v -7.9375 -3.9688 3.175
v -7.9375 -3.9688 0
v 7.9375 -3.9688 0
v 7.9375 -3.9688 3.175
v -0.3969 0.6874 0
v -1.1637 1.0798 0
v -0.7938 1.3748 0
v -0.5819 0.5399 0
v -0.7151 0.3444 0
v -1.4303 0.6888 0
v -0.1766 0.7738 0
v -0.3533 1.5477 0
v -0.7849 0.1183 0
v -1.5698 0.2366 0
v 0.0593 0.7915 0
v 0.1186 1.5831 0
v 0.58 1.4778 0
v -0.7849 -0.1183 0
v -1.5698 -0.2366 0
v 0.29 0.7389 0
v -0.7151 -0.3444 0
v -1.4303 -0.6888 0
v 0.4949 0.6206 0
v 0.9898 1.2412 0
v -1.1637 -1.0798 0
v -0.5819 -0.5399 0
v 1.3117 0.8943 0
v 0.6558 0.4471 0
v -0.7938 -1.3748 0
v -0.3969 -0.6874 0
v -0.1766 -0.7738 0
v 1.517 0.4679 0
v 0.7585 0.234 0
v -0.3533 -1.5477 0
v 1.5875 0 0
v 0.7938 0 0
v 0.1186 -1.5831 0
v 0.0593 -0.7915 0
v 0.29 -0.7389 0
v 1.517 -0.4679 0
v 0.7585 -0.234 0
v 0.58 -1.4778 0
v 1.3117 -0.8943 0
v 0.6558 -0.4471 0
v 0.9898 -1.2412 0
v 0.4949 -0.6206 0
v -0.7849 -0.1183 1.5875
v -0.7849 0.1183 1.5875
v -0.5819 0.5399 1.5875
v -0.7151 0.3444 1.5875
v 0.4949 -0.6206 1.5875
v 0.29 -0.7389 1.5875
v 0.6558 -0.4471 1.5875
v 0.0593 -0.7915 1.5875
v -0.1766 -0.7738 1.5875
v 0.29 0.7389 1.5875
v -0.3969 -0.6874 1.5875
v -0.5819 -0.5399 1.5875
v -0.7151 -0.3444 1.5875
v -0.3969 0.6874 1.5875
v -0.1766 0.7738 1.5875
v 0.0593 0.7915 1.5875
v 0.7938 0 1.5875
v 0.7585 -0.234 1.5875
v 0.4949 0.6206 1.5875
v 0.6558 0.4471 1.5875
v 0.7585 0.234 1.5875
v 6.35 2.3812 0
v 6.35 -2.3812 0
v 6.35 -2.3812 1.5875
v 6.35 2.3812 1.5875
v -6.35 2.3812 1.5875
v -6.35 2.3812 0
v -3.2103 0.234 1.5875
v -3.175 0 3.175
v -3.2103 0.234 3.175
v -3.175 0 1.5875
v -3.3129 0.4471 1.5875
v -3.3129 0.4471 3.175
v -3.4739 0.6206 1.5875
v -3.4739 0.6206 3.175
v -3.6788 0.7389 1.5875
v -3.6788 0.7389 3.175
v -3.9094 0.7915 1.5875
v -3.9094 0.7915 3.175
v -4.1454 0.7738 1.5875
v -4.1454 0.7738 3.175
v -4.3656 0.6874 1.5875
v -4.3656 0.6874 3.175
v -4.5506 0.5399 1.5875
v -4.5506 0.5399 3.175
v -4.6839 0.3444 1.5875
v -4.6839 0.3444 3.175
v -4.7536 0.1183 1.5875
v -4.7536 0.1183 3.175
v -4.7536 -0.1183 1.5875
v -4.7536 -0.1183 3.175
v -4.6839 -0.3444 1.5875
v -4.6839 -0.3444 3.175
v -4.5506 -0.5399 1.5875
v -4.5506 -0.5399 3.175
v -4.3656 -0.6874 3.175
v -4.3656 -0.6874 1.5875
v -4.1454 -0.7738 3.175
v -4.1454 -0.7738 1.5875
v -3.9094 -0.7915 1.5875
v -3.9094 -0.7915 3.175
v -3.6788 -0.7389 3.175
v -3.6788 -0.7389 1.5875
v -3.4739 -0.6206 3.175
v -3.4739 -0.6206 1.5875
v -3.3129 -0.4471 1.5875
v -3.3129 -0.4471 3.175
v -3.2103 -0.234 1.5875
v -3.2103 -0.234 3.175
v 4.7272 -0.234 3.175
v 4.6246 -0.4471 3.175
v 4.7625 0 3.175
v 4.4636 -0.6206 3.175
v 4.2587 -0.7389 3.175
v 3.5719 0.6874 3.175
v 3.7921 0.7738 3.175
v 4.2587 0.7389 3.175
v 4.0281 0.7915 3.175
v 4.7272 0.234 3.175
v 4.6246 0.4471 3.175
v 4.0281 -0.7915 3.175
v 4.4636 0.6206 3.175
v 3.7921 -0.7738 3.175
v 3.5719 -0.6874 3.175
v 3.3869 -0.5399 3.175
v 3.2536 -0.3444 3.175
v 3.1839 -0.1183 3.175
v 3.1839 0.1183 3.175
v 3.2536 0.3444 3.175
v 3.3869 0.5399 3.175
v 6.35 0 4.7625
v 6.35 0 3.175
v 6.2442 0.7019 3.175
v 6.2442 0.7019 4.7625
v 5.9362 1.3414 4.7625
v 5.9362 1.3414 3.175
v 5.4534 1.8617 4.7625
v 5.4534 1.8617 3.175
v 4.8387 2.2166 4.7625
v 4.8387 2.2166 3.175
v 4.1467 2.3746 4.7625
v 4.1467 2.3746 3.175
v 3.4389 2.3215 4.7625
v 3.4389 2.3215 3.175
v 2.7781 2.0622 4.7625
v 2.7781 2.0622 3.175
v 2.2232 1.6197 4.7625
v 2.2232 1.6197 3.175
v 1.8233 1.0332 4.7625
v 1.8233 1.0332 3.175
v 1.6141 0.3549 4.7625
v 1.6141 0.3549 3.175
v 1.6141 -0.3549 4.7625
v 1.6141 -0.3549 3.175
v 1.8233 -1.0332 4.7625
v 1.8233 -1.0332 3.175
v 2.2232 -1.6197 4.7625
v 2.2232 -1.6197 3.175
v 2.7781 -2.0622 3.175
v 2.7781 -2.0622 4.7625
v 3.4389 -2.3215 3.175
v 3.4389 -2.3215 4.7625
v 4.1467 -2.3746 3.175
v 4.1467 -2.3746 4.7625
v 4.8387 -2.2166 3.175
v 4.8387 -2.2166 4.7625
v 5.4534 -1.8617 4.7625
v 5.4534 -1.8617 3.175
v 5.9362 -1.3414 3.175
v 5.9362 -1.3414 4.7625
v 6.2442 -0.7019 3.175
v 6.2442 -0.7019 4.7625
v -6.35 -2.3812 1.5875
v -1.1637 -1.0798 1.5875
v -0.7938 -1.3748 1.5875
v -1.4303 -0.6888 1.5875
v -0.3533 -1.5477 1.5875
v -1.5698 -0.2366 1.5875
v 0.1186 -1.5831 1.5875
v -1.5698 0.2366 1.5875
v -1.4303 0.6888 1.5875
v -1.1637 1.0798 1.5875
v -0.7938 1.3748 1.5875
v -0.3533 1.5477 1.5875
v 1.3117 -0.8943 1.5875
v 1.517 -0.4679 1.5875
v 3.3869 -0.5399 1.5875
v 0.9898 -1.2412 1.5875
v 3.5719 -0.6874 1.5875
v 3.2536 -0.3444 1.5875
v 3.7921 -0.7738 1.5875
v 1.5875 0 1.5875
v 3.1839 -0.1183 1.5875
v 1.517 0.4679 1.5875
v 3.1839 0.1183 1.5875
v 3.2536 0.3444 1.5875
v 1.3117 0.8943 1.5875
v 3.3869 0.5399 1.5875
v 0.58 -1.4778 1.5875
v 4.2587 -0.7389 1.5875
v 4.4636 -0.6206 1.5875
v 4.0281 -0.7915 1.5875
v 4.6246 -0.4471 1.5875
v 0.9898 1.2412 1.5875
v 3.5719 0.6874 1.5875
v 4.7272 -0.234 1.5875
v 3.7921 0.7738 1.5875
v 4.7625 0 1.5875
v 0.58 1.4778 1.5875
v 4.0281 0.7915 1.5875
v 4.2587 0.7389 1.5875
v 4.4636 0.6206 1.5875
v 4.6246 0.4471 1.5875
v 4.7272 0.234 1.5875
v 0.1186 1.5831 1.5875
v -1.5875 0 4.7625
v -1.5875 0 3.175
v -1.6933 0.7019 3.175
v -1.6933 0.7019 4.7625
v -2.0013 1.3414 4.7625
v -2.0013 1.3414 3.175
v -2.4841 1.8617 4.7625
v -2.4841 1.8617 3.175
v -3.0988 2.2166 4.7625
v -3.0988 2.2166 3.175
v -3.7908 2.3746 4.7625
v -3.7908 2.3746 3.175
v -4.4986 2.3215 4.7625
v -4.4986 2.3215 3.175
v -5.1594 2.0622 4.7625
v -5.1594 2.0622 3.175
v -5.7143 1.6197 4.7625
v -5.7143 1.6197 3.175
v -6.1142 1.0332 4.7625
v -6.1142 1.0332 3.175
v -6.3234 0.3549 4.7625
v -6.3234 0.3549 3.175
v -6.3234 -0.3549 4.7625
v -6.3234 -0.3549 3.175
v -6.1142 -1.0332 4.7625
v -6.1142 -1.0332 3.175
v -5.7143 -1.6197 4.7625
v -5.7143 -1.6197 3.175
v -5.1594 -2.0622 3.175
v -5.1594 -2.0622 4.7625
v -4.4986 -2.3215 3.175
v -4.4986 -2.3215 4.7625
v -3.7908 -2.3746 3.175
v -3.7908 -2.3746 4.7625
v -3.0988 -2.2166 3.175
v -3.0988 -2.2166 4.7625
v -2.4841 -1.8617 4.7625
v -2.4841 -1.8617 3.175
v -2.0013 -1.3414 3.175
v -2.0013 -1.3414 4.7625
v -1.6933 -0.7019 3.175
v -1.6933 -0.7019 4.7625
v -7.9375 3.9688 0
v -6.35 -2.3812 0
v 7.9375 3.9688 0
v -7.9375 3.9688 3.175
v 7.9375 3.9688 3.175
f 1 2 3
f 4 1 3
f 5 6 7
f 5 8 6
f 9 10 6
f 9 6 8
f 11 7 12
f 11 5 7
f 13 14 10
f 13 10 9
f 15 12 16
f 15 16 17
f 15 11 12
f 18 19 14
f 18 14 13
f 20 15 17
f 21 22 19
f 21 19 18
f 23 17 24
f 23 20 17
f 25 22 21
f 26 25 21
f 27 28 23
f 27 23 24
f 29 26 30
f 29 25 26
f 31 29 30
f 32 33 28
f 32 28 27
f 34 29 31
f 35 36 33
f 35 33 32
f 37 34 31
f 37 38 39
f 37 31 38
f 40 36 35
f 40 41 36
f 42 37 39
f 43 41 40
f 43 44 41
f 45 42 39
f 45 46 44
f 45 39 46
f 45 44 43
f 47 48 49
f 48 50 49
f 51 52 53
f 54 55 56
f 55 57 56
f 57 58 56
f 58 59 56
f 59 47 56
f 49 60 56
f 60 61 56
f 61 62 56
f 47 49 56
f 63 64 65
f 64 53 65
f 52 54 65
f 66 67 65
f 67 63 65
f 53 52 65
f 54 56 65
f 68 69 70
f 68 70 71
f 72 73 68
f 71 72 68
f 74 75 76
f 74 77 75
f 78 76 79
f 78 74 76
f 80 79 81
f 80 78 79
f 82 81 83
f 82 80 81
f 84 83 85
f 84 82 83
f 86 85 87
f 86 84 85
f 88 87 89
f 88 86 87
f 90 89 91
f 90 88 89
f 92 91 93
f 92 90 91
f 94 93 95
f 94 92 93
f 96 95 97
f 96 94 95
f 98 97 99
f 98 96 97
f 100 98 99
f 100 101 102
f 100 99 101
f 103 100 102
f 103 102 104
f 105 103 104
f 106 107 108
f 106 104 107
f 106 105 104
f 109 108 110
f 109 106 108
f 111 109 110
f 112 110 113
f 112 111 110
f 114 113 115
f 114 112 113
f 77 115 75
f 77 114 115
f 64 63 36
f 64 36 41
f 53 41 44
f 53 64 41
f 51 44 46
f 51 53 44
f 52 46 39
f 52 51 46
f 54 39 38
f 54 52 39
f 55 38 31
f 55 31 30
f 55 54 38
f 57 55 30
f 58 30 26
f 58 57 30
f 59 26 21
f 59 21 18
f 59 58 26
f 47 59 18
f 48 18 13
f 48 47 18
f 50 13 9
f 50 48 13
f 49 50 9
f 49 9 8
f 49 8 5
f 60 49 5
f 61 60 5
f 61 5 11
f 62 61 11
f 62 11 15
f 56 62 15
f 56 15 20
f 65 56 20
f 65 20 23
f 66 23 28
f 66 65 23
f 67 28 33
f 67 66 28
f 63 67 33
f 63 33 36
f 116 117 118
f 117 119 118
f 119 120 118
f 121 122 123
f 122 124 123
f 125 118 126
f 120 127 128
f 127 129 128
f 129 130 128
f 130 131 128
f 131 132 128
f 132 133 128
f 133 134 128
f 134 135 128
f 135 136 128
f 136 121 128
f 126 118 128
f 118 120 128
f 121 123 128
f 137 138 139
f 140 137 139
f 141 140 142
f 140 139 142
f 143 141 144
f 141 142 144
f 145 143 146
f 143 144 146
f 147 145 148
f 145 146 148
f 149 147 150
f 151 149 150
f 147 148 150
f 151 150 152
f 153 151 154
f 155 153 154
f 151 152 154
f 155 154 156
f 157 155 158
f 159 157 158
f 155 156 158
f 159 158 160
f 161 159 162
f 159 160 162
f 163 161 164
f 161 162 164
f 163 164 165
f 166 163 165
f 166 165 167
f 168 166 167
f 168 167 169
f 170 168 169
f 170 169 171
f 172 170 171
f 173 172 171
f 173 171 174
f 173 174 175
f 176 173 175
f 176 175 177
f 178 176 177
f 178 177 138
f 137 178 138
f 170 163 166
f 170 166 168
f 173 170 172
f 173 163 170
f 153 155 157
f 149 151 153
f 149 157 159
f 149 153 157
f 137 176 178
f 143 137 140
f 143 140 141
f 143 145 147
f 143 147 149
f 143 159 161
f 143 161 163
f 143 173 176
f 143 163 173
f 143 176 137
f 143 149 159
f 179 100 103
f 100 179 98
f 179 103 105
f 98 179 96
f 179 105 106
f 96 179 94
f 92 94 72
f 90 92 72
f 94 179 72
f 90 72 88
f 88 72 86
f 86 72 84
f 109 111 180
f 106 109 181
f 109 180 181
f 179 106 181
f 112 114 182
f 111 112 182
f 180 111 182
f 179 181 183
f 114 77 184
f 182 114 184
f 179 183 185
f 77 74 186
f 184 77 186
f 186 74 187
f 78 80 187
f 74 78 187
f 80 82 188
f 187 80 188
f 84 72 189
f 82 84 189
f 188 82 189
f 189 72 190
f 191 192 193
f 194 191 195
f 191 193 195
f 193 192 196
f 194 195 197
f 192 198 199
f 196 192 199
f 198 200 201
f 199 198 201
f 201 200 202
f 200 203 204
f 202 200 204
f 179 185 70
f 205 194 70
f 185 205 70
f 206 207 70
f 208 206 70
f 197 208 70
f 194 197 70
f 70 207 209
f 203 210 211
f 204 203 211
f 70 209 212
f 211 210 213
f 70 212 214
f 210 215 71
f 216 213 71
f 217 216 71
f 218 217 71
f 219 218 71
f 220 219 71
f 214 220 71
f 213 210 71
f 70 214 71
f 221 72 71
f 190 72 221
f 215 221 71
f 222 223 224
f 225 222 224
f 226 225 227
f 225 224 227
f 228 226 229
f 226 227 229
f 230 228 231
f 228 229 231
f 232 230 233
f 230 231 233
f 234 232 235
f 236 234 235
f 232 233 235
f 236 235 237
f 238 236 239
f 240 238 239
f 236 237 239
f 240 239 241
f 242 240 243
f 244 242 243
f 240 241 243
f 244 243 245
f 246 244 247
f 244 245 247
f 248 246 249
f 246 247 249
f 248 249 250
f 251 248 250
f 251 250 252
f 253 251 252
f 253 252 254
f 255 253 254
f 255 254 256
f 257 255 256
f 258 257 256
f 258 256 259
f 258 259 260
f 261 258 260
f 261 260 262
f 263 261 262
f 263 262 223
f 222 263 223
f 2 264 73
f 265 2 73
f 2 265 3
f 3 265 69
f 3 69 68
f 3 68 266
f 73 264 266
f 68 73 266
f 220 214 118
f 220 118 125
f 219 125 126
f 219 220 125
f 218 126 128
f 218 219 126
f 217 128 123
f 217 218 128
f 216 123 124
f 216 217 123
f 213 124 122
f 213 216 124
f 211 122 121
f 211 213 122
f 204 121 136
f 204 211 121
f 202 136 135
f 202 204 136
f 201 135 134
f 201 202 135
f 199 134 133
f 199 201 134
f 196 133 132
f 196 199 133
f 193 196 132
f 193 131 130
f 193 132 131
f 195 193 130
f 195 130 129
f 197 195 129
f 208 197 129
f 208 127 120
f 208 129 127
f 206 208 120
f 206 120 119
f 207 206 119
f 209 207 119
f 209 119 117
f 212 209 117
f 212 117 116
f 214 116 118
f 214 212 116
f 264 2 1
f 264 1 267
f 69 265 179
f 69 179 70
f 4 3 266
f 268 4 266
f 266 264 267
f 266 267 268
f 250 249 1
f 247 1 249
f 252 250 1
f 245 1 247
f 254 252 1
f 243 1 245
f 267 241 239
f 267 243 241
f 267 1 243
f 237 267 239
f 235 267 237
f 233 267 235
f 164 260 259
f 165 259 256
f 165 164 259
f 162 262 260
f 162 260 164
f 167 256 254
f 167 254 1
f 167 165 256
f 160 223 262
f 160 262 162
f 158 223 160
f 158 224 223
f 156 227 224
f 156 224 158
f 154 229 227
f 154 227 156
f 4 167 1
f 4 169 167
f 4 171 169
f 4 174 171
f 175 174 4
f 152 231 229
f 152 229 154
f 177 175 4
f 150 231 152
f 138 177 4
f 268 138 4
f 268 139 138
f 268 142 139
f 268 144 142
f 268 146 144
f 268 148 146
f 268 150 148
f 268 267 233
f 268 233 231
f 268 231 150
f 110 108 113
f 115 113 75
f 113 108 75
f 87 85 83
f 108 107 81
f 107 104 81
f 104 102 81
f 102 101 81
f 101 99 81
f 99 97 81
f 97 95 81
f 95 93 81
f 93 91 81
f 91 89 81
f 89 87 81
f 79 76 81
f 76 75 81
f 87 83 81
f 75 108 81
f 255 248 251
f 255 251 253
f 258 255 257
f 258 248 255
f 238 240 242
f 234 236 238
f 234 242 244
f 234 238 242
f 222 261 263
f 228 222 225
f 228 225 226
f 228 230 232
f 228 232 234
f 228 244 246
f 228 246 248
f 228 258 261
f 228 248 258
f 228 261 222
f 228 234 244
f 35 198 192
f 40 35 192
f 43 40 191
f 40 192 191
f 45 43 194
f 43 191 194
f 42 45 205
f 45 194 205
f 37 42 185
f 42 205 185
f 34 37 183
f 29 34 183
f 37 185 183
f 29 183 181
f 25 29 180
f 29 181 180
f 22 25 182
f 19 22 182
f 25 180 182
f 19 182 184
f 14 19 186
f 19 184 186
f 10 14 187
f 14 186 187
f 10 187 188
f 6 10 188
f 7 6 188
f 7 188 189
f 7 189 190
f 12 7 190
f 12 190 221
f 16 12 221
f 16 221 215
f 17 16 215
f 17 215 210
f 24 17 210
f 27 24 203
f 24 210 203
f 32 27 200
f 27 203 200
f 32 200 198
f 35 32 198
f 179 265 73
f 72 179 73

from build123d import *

# Parameters (mm, degrees)
F0_W     = 15.875
F0_H     = 7.9375
F0_R     = 2.38125
F1_DEPTH = 3.175
F2_DEPTH = 4.7625
F3_T     = -1.5875
F4_R     = 1.5875
F4_R_2   = 0.79375
F5_DEPTH = 1.5875


with BuildPart() as f1:
    # F0 (on Top) → F1 (new body)
    with BuildSketch(Plane.XY):
        Rectangle(F0_W, F0_H)
        with Locations((-3.96875, 0)):
            Circle(F0_R, mode=Mode.SUBTRACT)
        with Locations((3.96875, 0)):
            Circle(F0_R, mode=Mode.SUBTRACT)
    extrude(amount=F1_DEPTH)

    # F0 (on Top) → F2 (join)
    with BuildSketch(Plane.XY):
        with Locations((3.96875, 0)):
            Circle(F0_R)
        with Locations((-3.96875, 0)):
            Circle(F0_R)
    extrude(amount=F2_DEPTH)

    # F3
    f3_openings = [f1.faces().sort_by_distance(p)[0] for p in [
        (0, 0, 0),
    ]]
    offset(amount=F3_T, openings=f3_openings, kind=Kind.INTERSECTION)

    # F4 (on face) → F5 (join)
    with BuildSketch(Plane(origin=(0, 0, 1.5875), x_dir=(1, 0, 0), z_dir=(0, 0, -1))):
        Circle(F4_R)
        Circle(F4_R_2, mode=Mode.SUBTRACT)
    extrude(amount=F5_DEPTH)


solid = f1.part
